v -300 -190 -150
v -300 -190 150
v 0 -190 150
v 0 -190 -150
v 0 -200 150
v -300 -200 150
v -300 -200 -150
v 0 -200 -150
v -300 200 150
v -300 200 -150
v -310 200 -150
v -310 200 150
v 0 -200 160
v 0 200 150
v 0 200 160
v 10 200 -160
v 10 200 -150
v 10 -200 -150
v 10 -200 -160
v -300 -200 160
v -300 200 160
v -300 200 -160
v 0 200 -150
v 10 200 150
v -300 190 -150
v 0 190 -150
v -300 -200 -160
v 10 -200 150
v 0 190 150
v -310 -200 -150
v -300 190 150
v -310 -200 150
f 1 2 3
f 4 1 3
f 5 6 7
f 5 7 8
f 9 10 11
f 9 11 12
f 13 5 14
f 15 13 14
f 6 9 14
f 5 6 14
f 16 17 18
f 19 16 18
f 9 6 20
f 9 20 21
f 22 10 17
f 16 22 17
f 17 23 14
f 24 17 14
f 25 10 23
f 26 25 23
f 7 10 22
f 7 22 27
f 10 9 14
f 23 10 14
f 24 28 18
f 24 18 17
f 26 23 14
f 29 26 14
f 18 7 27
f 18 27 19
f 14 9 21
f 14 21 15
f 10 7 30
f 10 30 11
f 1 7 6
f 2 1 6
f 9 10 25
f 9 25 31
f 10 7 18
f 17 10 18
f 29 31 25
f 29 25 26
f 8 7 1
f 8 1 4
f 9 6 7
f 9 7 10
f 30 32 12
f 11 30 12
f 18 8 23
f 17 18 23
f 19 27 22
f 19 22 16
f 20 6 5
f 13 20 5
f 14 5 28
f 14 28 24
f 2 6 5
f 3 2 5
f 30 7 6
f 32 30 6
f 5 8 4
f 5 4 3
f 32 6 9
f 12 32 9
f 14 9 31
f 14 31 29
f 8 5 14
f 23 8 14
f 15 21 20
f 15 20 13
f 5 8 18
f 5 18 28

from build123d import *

# Parameters (mm, degrees)
F0_W      = 400
F0_H      = 300
F1_DEPTH  = 10
F2_W      = 300
F2_H      = 300
F3_DEPTH  = 10
F7_W      = 300
F7_H      = 400
F8_DEPTH  = 10
F9_W      = 310
F9_H      = 400
F10_DEPTH = 10


with BuildPart() as f1:
    # F0 (on Right) → F1 (new body)
    with BuildSketch(Plane.YZ):
        Rectangle(F0_W, F0_H)
    extrude(amount=F1_DEPTH)


with BuildPart() as f3:
    # F2 (on face) → F3 (new body)
    with BuildSketch(Plane.XZ.offset(200)):
        with Locations((-150, 0)):
            Rectangle(F2_W, F2_H)
    extrude(amount=-F3_DEPTH)


with BuildPart() as f4_1:
    # F4: instance of F3
    add(f3.part.mirror(Plane.XZ))


with BuildPart() as f6_1:
    # F6: instance of F1
    add(f1.part.mirror(Plane(origin=(-150, 0, 0), x_dir=(0, 1, 0), z_dir=(-1, 0, 0))))


with BuildPart() as f8:
    # F7 (on face) → F8 (new body)
    with BuildSketch(Plane.XY.offset(150)):
        with Locations((-150, 0)):
            Rectangle(F7_W, F7_H)
    extrude(amount=F8_DEPTH)


with BuildPart() as f10:
    # F9 (on face) → F10 (new body)
    with BuildSketch(Plane(origin=(0, 0, -150), x_dir=(1, 0, 0), z_dir=(0, 0, -1))):
        with Locations((-145, 0)):
            Rectangle(F9_W, F9_H)
    extrude(amount=F10_DEPTH)


solid = Compound([f1.part, f3.part, f4_1.part, f6_1.part, f8.part, f10.part])
